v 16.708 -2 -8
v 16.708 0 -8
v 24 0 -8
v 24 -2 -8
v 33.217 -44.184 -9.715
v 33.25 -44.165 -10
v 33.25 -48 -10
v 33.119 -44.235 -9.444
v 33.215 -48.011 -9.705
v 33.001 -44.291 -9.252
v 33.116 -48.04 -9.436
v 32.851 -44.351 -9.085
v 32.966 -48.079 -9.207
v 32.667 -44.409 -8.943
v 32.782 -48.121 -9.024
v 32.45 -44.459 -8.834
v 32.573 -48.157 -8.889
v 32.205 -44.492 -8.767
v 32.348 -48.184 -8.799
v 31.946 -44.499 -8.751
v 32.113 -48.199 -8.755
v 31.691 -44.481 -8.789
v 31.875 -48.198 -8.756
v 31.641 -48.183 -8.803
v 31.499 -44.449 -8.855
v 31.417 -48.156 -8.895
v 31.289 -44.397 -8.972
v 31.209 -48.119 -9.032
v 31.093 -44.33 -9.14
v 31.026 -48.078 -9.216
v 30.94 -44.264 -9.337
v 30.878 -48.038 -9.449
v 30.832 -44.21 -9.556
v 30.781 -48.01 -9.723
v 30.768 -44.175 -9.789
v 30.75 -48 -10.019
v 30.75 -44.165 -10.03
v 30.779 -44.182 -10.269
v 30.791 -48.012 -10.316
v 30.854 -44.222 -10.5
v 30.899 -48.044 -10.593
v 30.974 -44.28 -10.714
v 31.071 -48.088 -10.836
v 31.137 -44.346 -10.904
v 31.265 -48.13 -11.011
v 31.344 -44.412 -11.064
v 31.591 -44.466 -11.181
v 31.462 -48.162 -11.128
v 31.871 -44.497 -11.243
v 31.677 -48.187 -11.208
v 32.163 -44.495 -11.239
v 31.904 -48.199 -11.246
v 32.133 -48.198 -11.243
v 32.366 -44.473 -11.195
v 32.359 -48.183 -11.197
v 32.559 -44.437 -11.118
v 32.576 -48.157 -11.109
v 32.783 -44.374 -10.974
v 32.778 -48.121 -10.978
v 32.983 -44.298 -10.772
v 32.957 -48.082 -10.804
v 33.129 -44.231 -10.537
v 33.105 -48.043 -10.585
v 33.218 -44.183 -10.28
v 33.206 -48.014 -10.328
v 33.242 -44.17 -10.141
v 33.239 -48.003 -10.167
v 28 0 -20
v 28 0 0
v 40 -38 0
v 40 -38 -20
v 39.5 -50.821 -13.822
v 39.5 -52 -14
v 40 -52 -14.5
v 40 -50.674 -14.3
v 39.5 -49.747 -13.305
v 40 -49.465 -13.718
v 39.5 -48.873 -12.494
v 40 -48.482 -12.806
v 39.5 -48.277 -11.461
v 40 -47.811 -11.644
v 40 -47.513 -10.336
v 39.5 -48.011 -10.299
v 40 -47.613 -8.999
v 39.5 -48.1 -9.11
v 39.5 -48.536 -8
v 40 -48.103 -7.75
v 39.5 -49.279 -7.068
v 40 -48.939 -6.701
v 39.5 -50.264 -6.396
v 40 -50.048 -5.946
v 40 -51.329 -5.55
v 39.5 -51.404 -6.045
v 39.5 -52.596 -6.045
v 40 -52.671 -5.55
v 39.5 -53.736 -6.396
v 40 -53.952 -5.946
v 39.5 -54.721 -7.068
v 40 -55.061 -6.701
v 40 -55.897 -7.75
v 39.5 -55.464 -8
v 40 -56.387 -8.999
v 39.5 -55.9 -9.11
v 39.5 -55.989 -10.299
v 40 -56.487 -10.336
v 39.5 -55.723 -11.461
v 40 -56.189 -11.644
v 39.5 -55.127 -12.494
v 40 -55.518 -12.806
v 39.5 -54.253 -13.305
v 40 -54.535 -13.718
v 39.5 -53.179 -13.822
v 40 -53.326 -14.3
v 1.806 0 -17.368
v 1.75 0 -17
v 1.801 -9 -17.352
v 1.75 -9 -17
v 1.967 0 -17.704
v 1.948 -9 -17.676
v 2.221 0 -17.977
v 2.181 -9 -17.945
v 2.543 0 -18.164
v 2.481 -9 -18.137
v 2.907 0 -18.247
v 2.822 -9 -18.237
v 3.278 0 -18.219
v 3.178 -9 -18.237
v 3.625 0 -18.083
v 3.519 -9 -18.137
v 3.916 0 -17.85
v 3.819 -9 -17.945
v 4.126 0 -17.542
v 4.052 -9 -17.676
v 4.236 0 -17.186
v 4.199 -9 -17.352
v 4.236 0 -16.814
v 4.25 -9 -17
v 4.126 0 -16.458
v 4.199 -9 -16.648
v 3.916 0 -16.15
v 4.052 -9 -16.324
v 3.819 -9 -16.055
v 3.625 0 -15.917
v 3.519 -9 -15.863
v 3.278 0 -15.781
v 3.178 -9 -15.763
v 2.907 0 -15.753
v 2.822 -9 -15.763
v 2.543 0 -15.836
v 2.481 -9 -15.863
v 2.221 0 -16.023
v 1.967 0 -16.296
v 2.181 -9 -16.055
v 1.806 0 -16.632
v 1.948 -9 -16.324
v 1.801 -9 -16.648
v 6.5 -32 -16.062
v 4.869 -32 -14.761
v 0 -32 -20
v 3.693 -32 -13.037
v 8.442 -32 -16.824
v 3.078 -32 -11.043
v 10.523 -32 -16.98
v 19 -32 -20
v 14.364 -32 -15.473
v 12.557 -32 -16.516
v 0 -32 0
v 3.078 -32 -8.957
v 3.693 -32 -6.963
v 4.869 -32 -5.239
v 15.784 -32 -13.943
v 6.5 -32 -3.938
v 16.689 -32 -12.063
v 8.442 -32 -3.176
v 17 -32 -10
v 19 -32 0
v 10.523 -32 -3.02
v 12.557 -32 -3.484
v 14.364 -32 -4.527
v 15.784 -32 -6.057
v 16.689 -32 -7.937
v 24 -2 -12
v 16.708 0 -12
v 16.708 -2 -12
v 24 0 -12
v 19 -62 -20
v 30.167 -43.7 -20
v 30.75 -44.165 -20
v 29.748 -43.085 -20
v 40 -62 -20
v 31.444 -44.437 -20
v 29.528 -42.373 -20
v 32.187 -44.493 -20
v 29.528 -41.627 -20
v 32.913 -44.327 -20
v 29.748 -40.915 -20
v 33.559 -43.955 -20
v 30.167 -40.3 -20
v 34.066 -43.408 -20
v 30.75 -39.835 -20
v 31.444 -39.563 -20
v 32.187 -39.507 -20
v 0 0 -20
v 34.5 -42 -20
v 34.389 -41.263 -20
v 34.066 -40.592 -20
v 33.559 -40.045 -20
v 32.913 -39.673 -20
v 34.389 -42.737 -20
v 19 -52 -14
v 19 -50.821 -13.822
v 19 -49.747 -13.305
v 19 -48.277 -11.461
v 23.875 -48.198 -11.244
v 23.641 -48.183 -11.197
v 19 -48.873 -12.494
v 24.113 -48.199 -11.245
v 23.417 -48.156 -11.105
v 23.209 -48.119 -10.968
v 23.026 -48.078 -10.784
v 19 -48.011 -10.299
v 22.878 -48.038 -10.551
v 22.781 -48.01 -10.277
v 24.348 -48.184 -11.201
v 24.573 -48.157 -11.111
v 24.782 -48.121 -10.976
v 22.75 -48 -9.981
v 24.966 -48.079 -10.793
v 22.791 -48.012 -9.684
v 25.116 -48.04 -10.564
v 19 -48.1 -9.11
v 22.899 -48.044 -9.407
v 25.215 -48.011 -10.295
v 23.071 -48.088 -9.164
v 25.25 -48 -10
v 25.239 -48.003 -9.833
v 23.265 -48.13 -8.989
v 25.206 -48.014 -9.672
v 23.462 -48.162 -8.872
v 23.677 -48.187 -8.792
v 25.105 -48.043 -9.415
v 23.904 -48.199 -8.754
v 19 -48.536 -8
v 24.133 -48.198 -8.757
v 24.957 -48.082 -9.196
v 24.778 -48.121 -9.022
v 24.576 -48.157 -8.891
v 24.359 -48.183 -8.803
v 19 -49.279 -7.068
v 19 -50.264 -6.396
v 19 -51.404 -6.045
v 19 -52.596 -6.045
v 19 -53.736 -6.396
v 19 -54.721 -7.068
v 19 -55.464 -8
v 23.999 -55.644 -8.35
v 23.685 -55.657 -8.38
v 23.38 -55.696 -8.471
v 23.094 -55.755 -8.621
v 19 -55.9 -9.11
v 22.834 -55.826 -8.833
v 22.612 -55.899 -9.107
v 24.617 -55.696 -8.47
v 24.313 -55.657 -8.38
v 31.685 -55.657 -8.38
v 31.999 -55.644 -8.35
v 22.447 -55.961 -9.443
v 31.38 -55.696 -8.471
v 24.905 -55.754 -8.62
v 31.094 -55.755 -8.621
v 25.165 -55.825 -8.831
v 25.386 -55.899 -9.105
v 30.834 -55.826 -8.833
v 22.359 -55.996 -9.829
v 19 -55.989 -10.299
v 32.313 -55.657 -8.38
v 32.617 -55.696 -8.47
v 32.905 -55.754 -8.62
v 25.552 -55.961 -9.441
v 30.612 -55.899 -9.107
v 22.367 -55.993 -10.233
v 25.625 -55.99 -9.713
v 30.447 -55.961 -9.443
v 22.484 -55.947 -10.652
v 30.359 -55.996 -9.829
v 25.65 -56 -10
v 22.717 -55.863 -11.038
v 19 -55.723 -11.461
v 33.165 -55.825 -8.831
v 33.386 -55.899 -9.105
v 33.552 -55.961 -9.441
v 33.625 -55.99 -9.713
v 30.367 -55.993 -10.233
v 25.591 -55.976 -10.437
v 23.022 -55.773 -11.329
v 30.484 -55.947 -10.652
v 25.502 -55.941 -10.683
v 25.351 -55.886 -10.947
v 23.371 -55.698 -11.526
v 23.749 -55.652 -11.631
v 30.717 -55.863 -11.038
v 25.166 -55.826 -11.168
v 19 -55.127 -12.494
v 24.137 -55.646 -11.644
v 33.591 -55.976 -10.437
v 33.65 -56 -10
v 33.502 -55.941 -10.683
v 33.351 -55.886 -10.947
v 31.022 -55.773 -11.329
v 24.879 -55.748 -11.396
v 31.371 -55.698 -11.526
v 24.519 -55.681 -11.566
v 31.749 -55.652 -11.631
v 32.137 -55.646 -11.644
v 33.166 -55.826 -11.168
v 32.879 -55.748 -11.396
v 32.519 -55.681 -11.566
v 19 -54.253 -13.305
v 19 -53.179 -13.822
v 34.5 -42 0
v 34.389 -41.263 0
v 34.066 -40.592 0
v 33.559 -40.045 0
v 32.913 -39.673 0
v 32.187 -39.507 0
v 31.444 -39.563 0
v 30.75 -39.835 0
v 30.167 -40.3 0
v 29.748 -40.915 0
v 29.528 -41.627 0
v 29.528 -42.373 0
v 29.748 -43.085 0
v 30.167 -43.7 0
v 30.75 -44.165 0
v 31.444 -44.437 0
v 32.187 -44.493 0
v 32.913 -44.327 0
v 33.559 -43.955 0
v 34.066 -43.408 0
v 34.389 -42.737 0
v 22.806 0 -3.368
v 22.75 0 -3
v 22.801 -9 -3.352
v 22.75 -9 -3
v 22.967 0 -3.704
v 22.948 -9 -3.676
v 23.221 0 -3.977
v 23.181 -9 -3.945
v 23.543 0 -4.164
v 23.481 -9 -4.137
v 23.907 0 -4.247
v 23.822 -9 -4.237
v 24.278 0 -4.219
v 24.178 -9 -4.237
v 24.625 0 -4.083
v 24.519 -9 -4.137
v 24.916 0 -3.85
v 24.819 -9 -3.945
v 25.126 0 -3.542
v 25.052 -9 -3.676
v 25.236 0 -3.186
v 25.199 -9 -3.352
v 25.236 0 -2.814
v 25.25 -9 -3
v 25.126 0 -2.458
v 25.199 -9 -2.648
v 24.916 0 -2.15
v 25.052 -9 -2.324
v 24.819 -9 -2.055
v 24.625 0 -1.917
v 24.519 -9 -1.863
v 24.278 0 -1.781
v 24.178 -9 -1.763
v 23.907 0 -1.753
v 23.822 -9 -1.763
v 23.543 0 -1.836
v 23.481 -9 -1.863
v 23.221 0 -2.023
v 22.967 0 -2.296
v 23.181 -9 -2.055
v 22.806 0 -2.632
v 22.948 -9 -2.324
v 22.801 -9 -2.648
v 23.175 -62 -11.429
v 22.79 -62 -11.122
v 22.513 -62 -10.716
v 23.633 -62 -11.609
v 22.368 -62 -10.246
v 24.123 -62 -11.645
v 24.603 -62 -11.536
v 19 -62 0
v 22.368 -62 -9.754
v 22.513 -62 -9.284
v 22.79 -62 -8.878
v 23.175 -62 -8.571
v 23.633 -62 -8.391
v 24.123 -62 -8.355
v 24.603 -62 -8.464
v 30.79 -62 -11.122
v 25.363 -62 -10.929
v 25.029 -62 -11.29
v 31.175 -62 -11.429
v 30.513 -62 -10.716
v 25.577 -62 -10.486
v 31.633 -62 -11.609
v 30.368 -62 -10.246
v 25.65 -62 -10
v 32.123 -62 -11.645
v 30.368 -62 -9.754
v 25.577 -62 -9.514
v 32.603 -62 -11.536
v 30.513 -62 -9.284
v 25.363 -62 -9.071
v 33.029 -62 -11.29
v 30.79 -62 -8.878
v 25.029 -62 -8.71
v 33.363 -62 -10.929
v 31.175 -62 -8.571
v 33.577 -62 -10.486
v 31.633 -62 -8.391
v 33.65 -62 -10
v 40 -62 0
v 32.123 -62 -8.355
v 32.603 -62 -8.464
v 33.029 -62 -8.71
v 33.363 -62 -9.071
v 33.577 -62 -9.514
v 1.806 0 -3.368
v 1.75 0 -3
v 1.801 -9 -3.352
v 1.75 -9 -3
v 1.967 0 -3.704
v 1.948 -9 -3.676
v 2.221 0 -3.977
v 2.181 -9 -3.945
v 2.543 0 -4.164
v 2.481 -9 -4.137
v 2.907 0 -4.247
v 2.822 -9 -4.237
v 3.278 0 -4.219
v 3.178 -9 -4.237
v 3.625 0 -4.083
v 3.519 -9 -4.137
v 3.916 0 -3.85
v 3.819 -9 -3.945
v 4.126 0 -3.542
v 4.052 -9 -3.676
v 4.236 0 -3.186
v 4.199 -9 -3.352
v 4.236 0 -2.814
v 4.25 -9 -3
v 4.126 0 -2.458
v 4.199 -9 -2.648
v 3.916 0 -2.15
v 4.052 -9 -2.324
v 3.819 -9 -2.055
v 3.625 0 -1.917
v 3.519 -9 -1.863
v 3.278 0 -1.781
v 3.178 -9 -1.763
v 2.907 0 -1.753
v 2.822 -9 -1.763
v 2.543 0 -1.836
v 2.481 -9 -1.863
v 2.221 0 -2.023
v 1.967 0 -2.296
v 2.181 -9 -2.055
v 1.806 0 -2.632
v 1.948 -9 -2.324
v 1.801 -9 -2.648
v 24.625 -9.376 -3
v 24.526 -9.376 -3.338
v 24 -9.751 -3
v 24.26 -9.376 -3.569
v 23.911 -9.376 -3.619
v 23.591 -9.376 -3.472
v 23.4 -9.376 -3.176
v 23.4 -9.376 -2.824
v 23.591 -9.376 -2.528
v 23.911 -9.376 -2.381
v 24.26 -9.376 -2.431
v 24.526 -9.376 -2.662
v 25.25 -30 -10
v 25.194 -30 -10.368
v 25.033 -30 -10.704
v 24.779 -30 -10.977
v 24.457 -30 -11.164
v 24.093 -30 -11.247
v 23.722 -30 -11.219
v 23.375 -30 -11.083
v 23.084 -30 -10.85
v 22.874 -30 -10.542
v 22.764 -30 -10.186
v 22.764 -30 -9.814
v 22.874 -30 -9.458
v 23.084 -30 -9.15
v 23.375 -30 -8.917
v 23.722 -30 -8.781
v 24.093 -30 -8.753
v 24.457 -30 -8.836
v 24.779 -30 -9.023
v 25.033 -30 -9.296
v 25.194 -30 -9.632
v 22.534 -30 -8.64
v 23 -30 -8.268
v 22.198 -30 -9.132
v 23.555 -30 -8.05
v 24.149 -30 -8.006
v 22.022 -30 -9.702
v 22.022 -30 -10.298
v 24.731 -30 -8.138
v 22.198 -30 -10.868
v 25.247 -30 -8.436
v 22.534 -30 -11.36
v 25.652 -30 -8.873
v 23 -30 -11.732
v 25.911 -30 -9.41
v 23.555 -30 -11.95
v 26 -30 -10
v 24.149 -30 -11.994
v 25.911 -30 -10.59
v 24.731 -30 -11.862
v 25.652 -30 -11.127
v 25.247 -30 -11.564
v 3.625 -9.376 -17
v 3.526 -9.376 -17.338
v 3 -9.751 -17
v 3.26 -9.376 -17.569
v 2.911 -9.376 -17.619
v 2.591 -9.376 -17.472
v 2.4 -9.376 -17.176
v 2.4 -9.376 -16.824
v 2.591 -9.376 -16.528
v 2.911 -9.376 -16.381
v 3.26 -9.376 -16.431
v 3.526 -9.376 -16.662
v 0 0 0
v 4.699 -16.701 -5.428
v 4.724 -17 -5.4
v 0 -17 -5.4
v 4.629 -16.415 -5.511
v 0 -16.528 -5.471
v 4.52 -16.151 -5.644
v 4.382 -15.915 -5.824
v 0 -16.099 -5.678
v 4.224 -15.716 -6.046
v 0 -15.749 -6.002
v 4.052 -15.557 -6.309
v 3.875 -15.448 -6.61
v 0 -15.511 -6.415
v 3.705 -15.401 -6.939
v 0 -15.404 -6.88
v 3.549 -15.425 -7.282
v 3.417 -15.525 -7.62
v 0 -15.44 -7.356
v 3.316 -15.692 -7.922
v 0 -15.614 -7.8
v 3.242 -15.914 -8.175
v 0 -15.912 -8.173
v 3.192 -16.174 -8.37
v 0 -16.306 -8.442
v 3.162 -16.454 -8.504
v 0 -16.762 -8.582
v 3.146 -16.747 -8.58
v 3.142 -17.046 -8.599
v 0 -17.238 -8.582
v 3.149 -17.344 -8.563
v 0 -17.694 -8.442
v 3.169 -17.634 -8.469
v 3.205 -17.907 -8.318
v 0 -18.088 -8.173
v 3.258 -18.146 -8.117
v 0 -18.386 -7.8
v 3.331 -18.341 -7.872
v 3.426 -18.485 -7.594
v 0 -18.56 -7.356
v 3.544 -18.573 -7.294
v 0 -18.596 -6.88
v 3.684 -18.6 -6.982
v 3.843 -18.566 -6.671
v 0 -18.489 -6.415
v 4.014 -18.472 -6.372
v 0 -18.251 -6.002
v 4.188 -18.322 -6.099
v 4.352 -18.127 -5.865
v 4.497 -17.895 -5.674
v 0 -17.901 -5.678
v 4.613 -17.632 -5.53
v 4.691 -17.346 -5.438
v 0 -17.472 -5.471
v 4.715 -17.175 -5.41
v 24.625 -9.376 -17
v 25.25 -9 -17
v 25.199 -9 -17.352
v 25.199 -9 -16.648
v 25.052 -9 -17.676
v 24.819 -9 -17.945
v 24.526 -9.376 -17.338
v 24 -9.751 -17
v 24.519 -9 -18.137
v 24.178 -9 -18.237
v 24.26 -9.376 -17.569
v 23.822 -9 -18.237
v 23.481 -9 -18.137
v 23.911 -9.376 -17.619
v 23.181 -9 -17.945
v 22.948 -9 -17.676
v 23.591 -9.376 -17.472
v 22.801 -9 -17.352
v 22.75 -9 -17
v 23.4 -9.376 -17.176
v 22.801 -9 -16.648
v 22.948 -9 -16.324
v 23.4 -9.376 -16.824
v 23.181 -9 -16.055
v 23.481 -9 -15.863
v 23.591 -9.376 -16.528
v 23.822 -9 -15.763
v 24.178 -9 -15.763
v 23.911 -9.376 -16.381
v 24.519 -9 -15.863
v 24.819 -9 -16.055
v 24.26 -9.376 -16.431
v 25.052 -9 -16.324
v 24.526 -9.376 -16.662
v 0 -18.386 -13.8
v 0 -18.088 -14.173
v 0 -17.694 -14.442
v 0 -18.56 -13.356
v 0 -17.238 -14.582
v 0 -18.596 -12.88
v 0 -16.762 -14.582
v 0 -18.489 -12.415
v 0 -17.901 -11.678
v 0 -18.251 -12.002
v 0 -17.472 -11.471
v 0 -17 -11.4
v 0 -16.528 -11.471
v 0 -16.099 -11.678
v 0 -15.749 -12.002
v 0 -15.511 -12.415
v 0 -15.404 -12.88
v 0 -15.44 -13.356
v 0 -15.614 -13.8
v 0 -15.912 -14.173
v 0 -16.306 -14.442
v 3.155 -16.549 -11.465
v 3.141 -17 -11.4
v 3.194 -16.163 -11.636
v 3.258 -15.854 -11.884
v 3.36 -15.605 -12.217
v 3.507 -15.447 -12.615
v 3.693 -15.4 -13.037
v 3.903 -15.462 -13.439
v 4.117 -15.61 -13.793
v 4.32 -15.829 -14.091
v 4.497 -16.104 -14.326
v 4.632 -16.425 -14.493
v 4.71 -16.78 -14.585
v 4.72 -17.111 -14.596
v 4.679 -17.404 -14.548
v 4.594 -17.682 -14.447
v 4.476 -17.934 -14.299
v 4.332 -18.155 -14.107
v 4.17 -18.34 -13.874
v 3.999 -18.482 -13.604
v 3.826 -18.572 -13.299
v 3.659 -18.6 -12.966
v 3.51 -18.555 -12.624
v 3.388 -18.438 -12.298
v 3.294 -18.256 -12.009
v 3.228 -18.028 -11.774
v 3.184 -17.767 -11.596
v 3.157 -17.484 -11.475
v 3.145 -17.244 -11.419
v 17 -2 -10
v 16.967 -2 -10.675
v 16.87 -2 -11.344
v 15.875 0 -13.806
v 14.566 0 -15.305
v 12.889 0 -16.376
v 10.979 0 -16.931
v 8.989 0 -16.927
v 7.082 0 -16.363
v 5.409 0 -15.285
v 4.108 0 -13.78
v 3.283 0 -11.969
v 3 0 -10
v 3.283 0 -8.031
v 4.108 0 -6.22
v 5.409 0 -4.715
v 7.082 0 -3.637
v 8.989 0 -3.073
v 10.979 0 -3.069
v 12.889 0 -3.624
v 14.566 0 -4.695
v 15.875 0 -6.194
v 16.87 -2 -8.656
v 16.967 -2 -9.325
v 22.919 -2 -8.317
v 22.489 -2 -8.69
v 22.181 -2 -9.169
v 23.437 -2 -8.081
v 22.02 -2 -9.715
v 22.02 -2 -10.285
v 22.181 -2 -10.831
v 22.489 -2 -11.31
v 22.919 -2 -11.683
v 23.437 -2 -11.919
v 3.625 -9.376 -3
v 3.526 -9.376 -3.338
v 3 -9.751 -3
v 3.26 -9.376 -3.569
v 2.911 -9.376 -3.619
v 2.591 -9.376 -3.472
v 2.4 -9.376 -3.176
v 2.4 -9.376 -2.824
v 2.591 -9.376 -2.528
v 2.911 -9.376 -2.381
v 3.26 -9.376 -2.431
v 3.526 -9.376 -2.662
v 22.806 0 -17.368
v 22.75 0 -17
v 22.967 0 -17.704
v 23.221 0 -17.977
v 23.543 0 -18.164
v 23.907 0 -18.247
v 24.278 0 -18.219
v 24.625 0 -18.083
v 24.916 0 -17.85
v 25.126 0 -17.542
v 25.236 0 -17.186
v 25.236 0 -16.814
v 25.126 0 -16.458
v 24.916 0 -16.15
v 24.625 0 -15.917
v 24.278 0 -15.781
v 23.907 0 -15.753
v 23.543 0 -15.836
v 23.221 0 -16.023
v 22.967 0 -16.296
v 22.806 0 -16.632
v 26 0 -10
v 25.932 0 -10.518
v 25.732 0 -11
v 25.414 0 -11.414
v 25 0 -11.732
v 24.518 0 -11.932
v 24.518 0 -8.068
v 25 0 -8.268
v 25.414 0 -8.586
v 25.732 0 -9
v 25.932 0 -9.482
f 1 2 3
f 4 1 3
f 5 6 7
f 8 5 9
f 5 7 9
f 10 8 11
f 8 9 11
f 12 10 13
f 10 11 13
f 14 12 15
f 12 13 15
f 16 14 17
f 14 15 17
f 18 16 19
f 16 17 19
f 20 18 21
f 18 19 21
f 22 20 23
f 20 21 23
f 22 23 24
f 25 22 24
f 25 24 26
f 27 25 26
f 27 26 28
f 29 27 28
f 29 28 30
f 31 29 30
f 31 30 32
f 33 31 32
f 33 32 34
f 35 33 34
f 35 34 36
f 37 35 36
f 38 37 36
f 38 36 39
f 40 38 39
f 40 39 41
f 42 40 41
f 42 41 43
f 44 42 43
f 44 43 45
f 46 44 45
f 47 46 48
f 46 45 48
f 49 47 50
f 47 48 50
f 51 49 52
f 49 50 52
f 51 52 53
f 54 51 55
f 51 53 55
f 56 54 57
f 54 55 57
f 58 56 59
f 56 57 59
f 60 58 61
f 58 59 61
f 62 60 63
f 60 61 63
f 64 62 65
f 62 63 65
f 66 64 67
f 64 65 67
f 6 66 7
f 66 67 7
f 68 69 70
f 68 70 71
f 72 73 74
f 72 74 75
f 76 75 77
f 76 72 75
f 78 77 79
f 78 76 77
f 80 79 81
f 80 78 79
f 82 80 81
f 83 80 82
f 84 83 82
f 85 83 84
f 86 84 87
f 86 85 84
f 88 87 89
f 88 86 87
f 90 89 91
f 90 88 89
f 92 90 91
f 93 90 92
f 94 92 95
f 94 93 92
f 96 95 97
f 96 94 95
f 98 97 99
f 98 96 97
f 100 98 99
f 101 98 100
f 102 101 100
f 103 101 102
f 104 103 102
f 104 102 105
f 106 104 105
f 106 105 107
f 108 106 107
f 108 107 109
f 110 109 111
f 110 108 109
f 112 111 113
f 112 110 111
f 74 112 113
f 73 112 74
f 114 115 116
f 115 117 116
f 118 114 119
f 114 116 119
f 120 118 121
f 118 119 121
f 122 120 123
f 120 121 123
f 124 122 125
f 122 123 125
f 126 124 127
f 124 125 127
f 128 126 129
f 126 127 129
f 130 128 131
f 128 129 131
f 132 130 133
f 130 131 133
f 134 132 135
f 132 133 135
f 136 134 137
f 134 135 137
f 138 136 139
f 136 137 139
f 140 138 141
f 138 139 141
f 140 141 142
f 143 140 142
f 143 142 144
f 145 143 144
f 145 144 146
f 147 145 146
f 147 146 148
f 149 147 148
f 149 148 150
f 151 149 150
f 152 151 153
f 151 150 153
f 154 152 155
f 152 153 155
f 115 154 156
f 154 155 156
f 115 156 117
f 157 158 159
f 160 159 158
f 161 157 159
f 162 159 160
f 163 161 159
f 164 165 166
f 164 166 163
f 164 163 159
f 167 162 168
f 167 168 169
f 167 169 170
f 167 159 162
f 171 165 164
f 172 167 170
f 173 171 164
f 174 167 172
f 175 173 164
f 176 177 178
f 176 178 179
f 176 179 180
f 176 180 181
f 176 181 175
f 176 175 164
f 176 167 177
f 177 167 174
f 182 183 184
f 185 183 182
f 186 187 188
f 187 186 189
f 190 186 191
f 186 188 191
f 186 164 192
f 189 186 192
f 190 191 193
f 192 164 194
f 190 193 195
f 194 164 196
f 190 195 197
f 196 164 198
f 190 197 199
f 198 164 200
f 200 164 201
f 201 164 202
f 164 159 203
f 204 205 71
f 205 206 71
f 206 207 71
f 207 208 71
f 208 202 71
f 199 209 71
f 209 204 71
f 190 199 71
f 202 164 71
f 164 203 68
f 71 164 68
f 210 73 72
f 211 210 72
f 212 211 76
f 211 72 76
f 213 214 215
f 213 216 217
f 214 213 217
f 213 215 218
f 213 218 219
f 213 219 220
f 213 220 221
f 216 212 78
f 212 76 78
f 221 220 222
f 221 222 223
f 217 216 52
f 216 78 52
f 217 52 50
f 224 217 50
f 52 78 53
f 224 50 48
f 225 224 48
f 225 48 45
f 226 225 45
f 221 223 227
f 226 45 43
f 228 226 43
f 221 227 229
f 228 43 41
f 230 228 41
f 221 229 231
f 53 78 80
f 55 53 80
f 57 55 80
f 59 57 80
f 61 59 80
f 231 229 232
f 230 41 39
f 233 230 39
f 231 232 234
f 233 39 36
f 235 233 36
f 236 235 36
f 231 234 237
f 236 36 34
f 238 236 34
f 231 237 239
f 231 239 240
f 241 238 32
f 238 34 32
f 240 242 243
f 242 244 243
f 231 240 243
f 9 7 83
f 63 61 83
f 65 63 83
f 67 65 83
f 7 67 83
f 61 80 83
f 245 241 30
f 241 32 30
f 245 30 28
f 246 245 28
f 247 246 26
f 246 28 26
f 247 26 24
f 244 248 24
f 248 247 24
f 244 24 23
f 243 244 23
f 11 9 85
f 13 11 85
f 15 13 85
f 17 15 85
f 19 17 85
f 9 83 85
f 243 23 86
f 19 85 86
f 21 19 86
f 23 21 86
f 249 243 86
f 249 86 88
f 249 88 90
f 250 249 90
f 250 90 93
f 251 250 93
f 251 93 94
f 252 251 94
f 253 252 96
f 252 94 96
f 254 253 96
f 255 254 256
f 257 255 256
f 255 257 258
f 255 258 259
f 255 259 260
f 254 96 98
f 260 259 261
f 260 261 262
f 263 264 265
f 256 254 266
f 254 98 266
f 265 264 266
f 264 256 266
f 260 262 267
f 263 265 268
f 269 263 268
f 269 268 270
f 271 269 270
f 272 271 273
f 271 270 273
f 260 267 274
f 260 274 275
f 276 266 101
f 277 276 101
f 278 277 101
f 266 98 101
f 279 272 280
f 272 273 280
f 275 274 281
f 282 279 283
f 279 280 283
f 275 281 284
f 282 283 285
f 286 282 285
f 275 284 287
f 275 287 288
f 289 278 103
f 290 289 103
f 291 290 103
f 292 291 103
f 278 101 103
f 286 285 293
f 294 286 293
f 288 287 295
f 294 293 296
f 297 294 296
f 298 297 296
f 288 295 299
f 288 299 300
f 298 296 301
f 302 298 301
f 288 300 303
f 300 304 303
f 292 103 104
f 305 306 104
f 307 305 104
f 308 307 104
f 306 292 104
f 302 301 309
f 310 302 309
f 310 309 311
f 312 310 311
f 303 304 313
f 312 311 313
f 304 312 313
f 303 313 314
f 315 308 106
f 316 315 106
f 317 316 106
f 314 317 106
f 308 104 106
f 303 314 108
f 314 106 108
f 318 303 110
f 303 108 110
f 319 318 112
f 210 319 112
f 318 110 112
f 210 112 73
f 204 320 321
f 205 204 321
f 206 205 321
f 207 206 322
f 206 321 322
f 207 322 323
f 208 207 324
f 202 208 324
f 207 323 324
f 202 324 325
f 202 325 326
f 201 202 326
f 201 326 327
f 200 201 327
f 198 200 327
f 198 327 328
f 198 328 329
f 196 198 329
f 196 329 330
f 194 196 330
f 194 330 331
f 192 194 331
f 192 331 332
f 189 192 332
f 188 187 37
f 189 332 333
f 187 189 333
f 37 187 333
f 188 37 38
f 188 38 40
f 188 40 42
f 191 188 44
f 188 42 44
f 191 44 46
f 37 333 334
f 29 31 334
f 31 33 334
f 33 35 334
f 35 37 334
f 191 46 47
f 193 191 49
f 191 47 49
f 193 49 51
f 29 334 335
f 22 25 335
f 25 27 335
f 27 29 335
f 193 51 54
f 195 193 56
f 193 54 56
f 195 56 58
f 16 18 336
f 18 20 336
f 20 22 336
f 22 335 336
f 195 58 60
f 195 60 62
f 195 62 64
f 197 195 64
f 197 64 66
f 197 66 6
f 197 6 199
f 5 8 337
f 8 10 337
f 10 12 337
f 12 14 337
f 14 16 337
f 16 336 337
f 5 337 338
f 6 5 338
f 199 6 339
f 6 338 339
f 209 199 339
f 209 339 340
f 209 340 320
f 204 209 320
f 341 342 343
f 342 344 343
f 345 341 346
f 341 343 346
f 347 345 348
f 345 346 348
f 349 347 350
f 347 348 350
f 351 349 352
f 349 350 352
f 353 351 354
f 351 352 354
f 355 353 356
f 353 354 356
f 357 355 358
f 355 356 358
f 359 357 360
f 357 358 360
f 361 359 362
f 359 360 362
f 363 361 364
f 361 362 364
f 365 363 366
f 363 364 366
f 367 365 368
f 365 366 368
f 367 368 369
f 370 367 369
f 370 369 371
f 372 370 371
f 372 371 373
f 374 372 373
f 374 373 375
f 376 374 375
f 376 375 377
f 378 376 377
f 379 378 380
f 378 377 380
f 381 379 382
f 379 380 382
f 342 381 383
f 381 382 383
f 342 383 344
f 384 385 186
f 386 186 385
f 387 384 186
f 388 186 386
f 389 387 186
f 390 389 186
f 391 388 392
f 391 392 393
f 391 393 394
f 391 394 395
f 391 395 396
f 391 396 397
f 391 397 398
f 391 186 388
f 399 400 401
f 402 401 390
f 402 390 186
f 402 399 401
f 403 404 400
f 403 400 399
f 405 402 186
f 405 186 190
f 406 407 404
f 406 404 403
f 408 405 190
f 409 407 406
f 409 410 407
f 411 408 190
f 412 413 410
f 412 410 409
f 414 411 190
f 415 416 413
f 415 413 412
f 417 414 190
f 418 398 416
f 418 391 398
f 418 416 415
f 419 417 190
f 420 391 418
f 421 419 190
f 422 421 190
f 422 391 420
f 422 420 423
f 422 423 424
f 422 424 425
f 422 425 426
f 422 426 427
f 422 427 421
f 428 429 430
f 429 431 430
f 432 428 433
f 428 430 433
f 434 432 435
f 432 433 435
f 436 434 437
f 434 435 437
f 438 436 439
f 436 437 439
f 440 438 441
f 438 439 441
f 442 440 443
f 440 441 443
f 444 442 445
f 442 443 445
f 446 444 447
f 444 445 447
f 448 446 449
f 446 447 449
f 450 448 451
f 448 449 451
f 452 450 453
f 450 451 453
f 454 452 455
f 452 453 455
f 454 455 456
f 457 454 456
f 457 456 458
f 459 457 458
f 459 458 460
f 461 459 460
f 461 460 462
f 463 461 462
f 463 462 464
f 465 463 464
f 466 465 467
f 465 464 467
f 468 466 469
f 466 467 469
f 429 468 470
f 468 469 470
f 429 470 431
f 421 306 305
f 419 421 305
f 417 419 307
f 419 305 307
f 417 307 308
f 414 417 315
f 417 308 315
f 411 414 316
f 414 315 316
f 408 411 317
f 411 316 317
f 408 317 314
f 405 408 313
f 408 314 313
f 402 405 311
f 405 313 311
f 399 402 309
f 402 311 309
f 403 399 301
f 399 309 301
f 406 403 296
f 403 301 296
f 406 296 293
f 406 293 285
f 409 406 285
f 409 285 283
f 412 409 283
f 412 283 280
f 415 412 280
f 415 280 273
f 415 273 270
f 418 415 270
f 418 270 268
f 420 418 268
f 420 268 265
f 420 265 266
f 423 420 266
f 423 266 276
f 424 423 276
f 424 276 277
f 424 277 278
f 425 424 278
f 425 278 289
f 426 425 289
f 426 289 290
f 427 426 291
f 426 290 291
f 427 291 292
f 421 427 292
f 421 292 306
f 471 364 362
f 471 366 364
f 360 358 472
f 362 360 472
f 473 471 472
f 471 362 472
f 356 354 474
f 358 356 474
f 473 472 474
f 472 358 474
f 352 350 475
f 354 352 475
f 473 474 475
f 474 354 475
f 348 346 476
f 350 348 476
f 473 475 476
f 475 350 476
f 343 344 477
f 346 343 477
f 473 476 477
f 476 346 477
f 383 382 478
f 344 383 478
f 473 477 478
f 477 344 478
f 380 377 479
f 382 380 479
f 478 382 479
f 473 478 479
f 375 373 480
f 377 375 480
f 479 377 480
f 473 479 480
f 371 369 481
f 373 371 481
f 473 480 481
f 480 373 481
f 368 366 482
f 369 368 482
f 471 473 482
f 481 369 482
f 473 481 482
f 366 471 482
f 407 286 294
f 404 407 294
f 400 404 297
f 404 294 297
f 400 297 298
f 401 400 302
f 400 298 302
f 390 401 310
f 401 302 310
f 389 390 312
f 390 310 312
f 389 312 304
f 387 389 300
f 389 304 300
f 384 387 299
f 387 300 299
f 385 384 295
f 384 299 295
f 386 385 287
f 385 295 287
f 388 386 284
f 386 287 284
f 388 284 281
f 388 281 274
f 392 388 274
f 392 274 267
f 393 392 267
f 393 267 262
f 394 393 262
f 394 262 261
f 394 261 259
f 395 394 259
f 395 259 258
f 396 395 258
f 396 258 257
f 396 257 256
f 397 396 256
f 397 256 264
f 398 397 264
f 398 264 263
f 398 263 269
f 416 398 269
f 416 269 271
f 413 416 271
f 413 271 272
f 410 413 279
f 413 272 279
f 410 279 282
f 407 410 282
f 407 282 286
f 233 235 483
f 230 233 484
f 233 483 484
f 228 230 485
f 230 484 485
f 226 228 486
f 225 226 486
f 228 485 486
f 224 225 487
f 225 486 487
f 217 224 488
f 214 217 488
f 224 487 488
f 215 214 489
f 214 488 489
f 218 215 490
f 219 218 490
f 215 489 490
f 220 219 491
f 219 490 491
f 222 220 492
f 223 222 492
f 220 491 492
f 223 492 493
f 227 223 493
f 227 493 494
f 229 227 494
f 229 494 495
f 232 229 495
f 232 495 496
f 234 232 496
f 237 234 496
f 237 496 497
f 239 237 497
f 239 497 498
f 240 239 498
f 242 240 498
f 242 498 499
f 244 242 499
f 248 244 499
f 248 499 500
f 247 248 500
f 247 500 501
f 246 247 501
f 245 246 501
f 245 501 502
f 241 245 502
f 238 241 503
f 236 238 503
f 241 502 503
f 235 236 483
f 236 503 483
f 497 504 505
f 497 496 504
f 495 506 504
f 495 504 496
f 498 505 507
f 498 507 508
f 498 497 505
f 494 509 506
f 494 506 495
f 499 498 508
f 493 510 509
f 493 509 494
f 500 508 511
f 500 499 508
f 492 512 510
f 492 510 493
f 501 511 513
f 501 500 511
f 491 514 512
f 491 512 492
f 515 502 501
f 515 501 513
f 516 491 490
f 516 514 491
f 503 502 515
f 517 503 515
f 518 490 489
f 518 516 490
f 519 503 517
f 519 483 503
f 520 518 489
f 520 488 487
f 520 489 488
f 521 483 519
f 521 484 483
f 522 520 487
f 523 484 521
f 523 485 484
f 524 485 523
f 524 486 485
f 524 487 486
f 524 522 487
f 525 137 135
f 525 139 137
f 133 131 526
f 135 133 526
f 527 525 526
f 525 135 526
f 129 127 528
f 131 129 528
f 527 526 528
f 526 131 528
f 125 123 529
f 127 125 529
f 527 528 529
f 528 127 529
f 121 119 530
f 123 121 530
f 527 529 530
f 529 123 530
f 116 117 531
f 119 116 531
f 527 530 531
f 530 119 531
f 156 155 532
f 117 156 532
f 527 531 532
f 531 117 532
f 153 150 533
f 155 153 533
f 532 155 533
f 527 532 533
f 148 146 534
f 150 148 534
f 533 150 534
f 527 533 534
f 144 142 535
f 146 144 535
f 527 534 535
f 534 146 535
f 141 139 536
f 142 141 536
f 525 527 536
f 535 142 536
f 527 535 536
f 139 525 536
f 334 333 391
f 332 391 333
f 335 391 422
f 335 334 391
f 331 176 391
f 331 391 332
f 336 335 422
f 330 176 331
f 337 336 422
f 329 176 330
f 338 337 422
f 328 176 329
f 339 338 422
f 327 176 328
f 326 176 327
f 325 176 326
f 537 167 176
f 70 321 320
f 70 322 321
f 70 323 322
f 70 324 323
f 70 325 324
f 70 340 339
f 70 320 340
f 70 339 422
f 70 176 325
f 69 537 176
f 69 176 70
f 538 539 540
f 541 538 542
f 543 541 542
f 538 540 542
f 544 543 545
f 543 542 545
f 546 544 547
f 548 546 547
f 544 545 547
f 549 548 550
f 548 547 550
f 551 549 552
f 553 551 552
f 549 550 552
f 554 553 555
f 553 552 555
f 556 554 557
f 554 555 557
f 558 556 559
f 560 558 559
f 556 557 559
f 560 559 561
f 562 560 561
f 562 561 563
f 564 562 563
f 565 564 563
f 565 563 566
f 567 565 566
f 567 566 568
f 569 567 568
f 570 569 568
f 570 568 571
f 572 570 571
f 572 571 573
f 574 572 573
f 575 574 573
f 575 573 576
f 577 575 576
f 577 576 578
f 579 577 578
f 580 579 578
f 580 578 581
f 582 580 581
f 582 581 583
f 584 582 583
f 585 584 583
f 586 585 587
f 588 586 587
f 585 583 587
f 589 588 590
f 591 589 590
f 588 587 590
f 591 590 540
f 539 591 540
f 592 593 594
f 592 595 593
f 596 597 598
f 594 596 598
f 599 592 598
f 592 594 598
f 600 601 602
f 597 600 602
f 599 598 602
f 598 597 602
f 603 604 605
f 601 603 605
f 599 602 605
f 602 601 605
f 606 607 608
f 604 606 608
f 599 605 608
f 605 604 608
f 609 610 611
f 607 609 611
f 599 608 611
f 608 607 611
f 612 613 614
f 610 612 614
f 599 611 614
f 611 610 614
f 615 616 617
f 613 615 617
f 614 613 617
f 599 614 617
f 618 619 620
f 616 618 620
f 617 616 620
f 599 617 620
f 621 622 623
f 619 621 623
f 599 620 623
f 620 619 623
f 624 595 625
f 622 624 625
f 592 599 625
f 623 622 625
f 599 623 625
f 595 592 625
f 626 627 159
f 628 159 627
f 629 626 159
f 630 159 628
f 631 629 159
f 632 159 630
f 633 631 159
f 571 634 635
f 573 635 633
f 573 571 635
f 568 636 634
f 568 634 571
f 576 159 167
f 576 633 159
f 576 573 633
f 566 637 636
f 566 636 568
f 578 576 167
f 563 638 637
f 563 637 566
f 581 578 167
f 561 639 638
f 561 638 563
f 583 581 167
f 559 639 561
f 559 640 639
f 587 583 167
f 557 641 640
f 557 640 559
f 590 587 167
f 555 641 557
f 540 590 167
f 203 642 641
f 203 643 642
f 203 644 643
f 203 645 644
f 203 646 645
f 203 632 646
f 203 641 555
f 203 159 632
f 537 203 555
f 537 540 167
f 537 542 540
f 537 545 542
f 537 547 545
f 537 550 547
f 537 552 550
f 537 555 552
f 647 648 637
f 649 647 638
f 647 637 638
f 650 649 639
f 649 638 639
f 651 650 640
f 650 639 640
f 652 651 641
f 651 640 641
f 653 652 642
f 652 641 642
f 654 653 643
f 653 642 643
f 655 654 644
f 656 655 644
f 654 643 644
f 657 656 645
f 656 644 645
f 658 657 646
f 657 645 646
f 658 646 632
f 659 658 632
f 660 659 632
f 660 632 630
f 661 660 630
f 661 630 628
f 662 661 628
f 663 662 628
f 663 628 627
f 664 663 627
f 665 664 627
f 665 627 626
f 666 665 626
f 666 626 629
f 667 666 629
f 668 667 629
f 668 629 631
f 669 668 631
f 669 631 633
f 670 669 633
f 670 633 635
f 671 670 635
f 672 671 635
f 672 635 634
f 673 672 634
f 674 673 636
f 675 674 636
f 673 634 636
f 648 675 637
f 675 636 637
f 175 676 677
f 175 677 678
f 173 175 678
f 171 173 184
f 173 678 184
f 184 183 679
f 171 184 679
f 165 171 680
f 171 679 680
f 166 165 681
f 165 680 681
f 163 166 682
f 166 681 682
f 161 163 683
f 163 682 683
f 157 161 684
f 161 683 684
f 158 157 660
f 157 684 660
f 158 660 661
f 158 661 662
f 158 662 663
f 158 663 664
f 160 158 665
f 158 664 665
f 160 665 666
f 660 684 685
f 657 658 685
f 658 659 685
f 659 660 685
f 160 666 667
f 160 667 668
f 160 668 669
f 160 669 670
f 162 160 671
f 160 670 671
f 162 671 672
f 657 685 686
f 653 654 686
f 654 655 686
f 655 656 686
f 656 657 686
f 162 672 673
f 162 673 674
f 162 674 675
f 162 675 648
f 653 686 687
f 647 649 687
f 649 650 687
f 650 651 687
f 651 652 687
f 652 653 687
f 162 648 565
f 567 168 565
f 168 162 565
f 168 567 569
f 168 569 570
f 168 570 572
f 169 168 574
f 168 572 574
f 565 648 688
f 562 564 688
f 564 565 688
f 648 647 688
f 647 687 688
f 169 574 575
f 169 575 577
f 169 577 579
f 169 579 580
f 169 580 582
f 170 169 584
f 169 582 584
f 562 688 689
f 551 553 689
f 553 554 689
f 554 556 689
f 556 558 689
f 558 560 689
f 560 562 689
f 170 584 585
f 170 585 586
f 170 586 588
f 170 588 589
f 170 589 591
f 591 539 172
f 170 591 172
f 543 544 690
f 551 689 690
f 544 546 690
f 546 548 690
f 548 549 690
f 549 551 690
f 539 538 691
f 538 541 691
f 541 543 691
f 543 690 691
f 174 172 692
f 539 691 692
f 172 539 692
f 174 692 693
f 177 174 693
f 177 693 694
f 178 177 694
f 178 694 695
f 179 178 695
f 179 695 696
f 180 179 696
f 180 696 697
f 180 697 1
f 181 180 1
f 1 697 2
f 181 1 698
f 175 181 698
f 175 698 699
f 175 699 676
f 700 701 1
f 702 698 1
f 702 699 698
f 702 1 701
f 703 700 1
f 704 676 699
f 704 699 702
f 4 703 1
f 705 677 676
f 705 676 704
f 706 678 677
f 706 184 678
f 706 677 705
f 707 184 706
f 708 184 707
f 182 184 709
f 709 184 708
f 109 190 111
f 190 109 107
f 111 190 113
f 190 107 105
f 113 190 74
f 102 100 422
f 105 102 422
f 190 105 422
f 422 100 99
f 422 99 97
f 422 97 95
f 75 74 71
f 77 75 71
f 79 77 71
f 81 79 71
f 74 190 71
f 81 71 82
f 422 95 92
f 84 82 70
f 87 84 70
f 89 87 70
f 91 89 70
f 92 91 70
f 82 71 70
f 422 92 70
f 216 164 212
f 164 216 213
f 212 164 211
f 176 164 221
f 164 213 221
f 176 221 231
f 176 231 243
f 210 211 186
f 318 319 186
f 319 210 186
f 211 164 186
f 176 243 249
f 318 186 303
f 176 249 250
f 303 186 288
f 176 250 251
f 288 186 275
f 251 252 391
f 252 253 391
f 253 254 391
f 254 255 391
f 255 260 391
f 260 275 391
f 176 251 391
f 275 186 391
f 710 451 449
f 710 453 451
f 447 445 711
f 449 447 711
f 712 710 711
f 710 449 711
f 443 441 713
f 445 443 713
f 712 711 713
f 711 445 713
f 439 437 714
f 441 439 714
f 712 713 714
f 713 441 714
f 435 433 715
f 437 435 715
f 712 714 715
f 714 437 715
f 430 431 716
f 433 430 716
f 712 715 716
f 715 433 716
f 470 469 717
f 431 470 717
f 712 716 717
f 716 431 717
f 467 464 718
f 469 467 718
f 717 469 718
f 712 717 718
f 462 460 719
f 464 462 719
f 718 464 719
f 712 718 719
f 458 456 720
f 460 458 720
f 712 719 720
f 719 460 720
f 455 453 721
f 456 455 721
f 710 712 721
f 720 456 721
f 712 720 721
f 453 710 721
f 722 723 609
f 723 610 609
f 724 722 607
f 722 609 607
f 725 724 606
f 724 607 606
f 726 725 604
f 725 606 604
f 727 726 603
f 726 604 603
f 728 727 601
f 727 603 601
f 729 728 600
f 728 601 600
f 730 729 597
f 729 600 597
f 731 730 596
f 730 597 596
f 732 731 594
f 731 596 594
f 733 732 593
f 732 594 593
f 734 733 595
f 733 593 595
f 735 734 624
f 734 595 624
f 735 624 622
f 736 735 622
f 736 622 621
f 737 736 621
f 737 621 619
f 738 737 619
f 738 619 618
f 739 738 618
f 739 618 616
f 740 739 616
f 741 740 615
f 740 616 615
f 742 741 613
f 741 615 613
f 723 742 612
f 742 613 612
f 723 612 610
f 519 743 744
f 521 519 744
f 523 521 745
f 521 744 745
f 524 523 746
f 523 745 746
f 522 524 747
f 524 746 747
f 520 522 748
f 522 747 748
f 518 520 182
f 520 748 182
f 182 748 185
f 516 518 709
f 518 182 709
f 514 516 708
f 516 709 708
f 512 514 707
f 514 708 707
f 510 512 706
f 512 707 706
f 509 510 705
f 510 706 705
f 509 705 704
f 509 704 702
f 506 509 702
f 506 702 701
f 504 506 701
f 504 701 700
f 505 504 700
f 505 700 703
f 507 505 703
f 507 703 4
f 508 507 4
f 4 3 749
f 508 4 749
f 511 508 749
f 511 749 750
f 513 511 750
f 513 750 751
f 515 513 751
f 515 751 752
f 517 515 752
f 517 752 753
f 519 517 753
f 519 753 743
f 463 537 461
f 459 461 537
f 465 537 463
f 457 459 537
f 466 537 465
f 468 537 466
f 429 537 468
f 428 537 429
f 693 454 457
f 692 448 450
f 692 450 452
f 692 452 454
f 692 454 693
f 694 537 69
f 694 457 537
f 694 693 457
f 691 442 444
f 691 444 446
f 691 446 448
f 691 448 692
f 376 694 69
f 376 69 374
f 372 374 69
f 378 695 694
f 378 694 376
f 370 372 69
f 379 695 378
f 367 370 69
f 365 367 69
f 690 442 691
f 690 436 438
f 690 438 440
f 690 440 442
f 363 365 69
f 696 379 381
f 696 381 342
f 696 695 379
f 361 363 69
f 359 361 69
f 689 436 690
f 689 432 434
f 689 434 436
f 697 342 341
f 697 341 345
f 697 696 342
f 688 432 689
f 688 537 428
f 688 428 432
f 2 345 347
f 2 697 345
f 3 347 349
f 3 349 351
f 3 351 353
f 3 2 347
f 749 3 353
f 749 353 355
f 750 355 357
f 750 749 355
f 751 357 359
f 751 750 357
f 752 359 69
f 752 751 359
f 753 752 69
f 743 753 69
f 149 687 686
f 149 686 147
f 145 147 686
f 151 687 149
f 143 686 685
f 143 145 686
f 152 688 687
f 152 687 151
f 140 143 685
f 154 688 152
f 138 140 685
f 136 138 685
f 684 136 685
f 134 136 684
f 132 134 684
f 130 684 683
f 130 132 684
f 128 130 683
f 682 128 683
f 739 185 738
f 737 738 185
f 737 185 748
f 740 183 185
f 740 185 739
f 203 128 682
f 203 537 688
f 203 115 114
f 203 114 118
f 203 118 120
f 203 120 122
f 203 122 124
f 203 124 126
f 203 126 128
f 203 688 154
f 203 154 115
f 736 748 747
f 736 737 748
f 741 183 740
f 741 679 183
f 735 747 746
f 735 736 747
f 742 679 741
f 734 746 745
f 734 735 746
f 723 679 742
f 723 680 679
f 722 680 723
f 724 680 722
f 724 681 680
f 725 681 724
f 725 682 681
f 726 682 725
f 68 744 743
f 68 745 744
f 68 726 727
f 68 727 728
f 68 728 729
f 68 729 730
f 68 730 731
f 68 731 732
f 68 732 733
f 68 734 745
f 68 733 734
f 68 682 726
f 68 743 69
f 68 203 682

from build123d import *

# Parameters (mm, degrees)
SKETCH_1_W                = 28
SKETCH_1_H                = 20
SKETCH_2_W                = 40
SKETCH_2_H                = 20
SKETCH_3_W                = 40
SKETCH_3_H                = 20
EXTRUDE_1_DEPTH           = 24
SKETCH_4_W                = 19
SKETCH_4_H                = 20
CUT_EXTRUDE_1_DEPTH       = 30
HOLE_WIZARD_M31_D         = 2.5
HOLE_WIZARD_M31_DEPTH     = 9
HOLE_WIZARD_M31_TIP       = 0.751075774
SKETCH_11_R               = 7
CUT_EXTRUDE_3_DEPTH       = 32
SKETCH_12_R               = 2
CUT_EXTRUDE_4_DEPTH       = 30
SKETCH_13_R               = 1.25
CUT_EXTRUDE_5_DEPTH       = 22
CUT_EXTRUDE_6_REACH       = 42
SKETCH_14_R               = 1.6
SKETCH_15_R               = 4
CUT_EXTRUDE_7_DEPTH       = 21
CHAMFER_1_SIZE            = 0.5
HOLE_WIZARD_M41_D         = 3.3
HOLE_WIZARD_M41_DEPTH     = 10
HOLE_WIZARD_M41_TIP       = 0.991420021
SKETCH_21_R               = 2.5
CUT_EXTRUDE_8_DEPTH       = 20
CUT_EXTRUDE_9_REACH       = 64
SKETCH_22_R               = 1.25
SKETCH_23_W               = 12.954085538
SKETCH_23_H               = 2
CUT_EXTRUDE_10_DEPTH      = 2
CUT_EXTRUDE_10_DEPTH_BACK = 2


with BuildPart() as part:
    # Эскиз1 → По сечениям1 section 0
    with BuildSketch(Plane(origin=(0, 0, 0), x_dir=(1, 0, 0), z_dir=(0, 1, 0))):
        with Locations((14, 10)):
            Rectangle(SKETCH_1_W, SKETCH_1_H)
    # Эскиз2 → По сечениям1 section 1
    with BuildSketch(Plane(origin=(0, -38, 0), x_dir=(1, 0, 0), z_dir=(0, 1, 0))):
        with Locations((20, 10)):
            Rectangle(SKETCH_2_W, SKETCH_2_H)
    loft()

    # Эскиз3 → Бобышка-Вытянуть1 (add)
    with BuildSketch(Plane.XZ.offset(38)):
        with Locations((20, -10)):
            Rectangle(SKETCH_3_W, SKETCH_3_H)
    extrude(amount=EXTRUDE_1_DEPTH)

    # Эскиз4 → Вырез-Вытянуть1 (cut)
    with BuildSketch(Plane.XZ.offset(62)):
        with Locations((9.5, -10)):
            Rectangle(SKETCH_4_W, SKETCH_4_H)
    extrude(amount=-CUT_EXTRUDE_1_DEPTH, mode=Mode.SUBTRACT)

    # Отверстие обработанное метчиком M31
    with Locations(Plane(origin=(0, 0, 0), x_dir=(1, 0, 0), z_dir=(0, 1, 0))):
        with Locations((3, 3), (3, 17), (24, 17), (24, 3)):
            Hole(HOLE_WIZARD_M31_D / 2, depth=HOLE_WIZARD_M31_DEPTH)
            with Locations((0, 0, -(HOLE_WIZARD_M31_DEPTH + HOLE_WIZARD_M31_TIP / 2))):  # 118° drill point
                Cone(0, HOLE_WIZARD_M31_D / 2, HOLE_WIZARD_M31_TIP, mode=Mode.SUBTRACT)

    # Эскиз11 → Вырез-Вытянуть3 (cut)
    with BuildSketch(Plane(origin=(0, 0, 0), x_dir=(1, 0, 0), z_dir=(0, 1, 0))):
        with Locations((10, 10)):
            Circle(SKETCH_11_R)
    extrude(amount=-CUT_EXTRUDE_3_DEPTH, mode=Mode.SUBTRACT)

    # Эскиз12 → Вырез-Вытянуть4 (cut)
    with BuildSketch(Plane(origin=(0, 0, 0), x_dir=(1, 0, 0), z_dir=(0, 1, 0))):
        with Locations((24, 10)):
            Circle(SKETCH_12_R)
    extrude(amount=-CUT_EXTRUDE_4_DEPTH, mode=Mode.SUBTRACT)

    # Эскиз13 → Вырез-Вытянуть5 (cut)
    with BuildSketch(Plane(origin=(0, -30, 0), x_dir=(1, 0, 0), z_dir=(0, 1, 0))):
        with Locations((24, 10)):
            Circle(SKETCH_13_R)
    extrude(amount=-CUT_EXTRUDE_5_DEPTH, mode=Mode.SUBTRACT)

    # Эскиз14 → Вырез-Вытянуть6 (cut, up to next)
    with BuildSketch(Plane.ZY, mode=Mode.PRIVATE) as cut_extrude_6_sk1:
        with Locations((-13, -17)):
            Circle(SKETCH_14_R)
    cut_extrude_6_tool1 = extrude(cut_extrude_6_sk1.sketch, amount=-CUT_EXTRUDE_6_REACH, mode=Mode.PRIVATE) & part.part
    add(cut_extrude_6_tool1.solids().sort_by_distance((0, -17, -13))[0], mode=Mode.SUBTRACT)
    # Эскиз14 → Вырез-Вытянуть6 (cut, up to next)
    with BuildSketch(Plane.ZY, mode=Mode.PRIVATE) as cut_extrude_6_sk2:
        with Locations((-7, -17)):
            Circle(SKETCH_14_R)
    cut_extrude_6_tool2 = extrude(cut_extrude_6_sk2.sketch, amount=-CUT_EXTRUDE_6_REACH, mode=Mode.PRIVATE) & part.part
    add(cut_extrude_6_tool2.solids().sort_by_distance((0, -17, -7))[0], mode=Mode.SUBTRACT)

    # Эскиз15 → Вырез-Вытянуть7 (cut)
    with BuildSketch(Plane(origin=(40, 0, 0), x_dir=(0, 0, -1), z_dir=(1, 0, 0))):
        with Locations((10, -52)):
            Circle(SKETCH_15_R)
    extrude(amount=-CUT_EXTRUDE_7_DEPTH, mode=Mode.SUBTRACT)

    # Фаска1
    chamfer_1_edges = [part.edges().sort_by_distance(p)[0] for p in [
        (40, -52, -6),
    ]]
    chamfer(chamfer_1_edges, length=CHAMFER_1_SIZE)

    # Отверстие обработанное метчиком M41
    with Locations(Plane(origin=(0, -62, 0), x_dir=(-1, 0, 0), z_dir=(0, -1, 0))):
        with Locations((-32, 10), (-24, 10)):
            Hole(HOLE_WIZARD_M41_D / 2, depth=HOLE_WIZARD_M41_DEPTH)
            with Locations((0, 0, -(HOLE_WIZARD_M41_DEPTH + HOLE_WIZARD_M41_TIP / 2))):  # 118° drill point
                Cone(0, HOLE_WIZARD_M41_D / 2, HOLE_WIZARD_M41_TIP, mode=Mode.SUBTRACT)

    # Эскиз21 → Вырез-Вытянуть8 (cut)
    with BuildSketch(Plane.XY):
        with Locations((32, -42)):
            Circle(SKETCH_21_R)
    extrude(amount=-CUT_EXTRUDE_8_DEPTH, mode=Mode.SUBTRACT)

    # Эскиз22 → Вырез-Вытянуть9 (cut, up to next)
    with BuildSketch(Plane.XZ.offset(62), mode=Mode.PRIVATE) as cut_extrude_9_sk1:
        with Locations((32, -10)):
            Circle(SKETCH_22_R)
    cut_extrude_9_tool1 = extrude(cut_extrude_9_sk1.sketch, amount=-CUT_EXTRUDE_9_REACH, mode=Mode.PRIVATE) & part.part
    add(cut_extrude_9_tool1.solids().sort_by_distance((32, -62, -10))[0], mode=Mode.SUBTRACT)

    # Эскиз23 → Вырез-Вытянуть10 (cut, two sides)
    with BuildSketch(Plane.XY.offset(-10)) as cut_extrude_10_sk:
        with Locations((17.522957231, -1)):
            Rectangle(SKETCH_23_W, SKETCH_23_H)
    extrude(amount=CUT_EXTRUDE_10_DEPTH, mode=Mode.SUBTRACT)
    extrude(cut_extrude_10_sk.sketch, amount=-CUT_EXTRUDE_10_DEPTH_BACK, mode=Mode.SUBTRACT)


solid = part.part
